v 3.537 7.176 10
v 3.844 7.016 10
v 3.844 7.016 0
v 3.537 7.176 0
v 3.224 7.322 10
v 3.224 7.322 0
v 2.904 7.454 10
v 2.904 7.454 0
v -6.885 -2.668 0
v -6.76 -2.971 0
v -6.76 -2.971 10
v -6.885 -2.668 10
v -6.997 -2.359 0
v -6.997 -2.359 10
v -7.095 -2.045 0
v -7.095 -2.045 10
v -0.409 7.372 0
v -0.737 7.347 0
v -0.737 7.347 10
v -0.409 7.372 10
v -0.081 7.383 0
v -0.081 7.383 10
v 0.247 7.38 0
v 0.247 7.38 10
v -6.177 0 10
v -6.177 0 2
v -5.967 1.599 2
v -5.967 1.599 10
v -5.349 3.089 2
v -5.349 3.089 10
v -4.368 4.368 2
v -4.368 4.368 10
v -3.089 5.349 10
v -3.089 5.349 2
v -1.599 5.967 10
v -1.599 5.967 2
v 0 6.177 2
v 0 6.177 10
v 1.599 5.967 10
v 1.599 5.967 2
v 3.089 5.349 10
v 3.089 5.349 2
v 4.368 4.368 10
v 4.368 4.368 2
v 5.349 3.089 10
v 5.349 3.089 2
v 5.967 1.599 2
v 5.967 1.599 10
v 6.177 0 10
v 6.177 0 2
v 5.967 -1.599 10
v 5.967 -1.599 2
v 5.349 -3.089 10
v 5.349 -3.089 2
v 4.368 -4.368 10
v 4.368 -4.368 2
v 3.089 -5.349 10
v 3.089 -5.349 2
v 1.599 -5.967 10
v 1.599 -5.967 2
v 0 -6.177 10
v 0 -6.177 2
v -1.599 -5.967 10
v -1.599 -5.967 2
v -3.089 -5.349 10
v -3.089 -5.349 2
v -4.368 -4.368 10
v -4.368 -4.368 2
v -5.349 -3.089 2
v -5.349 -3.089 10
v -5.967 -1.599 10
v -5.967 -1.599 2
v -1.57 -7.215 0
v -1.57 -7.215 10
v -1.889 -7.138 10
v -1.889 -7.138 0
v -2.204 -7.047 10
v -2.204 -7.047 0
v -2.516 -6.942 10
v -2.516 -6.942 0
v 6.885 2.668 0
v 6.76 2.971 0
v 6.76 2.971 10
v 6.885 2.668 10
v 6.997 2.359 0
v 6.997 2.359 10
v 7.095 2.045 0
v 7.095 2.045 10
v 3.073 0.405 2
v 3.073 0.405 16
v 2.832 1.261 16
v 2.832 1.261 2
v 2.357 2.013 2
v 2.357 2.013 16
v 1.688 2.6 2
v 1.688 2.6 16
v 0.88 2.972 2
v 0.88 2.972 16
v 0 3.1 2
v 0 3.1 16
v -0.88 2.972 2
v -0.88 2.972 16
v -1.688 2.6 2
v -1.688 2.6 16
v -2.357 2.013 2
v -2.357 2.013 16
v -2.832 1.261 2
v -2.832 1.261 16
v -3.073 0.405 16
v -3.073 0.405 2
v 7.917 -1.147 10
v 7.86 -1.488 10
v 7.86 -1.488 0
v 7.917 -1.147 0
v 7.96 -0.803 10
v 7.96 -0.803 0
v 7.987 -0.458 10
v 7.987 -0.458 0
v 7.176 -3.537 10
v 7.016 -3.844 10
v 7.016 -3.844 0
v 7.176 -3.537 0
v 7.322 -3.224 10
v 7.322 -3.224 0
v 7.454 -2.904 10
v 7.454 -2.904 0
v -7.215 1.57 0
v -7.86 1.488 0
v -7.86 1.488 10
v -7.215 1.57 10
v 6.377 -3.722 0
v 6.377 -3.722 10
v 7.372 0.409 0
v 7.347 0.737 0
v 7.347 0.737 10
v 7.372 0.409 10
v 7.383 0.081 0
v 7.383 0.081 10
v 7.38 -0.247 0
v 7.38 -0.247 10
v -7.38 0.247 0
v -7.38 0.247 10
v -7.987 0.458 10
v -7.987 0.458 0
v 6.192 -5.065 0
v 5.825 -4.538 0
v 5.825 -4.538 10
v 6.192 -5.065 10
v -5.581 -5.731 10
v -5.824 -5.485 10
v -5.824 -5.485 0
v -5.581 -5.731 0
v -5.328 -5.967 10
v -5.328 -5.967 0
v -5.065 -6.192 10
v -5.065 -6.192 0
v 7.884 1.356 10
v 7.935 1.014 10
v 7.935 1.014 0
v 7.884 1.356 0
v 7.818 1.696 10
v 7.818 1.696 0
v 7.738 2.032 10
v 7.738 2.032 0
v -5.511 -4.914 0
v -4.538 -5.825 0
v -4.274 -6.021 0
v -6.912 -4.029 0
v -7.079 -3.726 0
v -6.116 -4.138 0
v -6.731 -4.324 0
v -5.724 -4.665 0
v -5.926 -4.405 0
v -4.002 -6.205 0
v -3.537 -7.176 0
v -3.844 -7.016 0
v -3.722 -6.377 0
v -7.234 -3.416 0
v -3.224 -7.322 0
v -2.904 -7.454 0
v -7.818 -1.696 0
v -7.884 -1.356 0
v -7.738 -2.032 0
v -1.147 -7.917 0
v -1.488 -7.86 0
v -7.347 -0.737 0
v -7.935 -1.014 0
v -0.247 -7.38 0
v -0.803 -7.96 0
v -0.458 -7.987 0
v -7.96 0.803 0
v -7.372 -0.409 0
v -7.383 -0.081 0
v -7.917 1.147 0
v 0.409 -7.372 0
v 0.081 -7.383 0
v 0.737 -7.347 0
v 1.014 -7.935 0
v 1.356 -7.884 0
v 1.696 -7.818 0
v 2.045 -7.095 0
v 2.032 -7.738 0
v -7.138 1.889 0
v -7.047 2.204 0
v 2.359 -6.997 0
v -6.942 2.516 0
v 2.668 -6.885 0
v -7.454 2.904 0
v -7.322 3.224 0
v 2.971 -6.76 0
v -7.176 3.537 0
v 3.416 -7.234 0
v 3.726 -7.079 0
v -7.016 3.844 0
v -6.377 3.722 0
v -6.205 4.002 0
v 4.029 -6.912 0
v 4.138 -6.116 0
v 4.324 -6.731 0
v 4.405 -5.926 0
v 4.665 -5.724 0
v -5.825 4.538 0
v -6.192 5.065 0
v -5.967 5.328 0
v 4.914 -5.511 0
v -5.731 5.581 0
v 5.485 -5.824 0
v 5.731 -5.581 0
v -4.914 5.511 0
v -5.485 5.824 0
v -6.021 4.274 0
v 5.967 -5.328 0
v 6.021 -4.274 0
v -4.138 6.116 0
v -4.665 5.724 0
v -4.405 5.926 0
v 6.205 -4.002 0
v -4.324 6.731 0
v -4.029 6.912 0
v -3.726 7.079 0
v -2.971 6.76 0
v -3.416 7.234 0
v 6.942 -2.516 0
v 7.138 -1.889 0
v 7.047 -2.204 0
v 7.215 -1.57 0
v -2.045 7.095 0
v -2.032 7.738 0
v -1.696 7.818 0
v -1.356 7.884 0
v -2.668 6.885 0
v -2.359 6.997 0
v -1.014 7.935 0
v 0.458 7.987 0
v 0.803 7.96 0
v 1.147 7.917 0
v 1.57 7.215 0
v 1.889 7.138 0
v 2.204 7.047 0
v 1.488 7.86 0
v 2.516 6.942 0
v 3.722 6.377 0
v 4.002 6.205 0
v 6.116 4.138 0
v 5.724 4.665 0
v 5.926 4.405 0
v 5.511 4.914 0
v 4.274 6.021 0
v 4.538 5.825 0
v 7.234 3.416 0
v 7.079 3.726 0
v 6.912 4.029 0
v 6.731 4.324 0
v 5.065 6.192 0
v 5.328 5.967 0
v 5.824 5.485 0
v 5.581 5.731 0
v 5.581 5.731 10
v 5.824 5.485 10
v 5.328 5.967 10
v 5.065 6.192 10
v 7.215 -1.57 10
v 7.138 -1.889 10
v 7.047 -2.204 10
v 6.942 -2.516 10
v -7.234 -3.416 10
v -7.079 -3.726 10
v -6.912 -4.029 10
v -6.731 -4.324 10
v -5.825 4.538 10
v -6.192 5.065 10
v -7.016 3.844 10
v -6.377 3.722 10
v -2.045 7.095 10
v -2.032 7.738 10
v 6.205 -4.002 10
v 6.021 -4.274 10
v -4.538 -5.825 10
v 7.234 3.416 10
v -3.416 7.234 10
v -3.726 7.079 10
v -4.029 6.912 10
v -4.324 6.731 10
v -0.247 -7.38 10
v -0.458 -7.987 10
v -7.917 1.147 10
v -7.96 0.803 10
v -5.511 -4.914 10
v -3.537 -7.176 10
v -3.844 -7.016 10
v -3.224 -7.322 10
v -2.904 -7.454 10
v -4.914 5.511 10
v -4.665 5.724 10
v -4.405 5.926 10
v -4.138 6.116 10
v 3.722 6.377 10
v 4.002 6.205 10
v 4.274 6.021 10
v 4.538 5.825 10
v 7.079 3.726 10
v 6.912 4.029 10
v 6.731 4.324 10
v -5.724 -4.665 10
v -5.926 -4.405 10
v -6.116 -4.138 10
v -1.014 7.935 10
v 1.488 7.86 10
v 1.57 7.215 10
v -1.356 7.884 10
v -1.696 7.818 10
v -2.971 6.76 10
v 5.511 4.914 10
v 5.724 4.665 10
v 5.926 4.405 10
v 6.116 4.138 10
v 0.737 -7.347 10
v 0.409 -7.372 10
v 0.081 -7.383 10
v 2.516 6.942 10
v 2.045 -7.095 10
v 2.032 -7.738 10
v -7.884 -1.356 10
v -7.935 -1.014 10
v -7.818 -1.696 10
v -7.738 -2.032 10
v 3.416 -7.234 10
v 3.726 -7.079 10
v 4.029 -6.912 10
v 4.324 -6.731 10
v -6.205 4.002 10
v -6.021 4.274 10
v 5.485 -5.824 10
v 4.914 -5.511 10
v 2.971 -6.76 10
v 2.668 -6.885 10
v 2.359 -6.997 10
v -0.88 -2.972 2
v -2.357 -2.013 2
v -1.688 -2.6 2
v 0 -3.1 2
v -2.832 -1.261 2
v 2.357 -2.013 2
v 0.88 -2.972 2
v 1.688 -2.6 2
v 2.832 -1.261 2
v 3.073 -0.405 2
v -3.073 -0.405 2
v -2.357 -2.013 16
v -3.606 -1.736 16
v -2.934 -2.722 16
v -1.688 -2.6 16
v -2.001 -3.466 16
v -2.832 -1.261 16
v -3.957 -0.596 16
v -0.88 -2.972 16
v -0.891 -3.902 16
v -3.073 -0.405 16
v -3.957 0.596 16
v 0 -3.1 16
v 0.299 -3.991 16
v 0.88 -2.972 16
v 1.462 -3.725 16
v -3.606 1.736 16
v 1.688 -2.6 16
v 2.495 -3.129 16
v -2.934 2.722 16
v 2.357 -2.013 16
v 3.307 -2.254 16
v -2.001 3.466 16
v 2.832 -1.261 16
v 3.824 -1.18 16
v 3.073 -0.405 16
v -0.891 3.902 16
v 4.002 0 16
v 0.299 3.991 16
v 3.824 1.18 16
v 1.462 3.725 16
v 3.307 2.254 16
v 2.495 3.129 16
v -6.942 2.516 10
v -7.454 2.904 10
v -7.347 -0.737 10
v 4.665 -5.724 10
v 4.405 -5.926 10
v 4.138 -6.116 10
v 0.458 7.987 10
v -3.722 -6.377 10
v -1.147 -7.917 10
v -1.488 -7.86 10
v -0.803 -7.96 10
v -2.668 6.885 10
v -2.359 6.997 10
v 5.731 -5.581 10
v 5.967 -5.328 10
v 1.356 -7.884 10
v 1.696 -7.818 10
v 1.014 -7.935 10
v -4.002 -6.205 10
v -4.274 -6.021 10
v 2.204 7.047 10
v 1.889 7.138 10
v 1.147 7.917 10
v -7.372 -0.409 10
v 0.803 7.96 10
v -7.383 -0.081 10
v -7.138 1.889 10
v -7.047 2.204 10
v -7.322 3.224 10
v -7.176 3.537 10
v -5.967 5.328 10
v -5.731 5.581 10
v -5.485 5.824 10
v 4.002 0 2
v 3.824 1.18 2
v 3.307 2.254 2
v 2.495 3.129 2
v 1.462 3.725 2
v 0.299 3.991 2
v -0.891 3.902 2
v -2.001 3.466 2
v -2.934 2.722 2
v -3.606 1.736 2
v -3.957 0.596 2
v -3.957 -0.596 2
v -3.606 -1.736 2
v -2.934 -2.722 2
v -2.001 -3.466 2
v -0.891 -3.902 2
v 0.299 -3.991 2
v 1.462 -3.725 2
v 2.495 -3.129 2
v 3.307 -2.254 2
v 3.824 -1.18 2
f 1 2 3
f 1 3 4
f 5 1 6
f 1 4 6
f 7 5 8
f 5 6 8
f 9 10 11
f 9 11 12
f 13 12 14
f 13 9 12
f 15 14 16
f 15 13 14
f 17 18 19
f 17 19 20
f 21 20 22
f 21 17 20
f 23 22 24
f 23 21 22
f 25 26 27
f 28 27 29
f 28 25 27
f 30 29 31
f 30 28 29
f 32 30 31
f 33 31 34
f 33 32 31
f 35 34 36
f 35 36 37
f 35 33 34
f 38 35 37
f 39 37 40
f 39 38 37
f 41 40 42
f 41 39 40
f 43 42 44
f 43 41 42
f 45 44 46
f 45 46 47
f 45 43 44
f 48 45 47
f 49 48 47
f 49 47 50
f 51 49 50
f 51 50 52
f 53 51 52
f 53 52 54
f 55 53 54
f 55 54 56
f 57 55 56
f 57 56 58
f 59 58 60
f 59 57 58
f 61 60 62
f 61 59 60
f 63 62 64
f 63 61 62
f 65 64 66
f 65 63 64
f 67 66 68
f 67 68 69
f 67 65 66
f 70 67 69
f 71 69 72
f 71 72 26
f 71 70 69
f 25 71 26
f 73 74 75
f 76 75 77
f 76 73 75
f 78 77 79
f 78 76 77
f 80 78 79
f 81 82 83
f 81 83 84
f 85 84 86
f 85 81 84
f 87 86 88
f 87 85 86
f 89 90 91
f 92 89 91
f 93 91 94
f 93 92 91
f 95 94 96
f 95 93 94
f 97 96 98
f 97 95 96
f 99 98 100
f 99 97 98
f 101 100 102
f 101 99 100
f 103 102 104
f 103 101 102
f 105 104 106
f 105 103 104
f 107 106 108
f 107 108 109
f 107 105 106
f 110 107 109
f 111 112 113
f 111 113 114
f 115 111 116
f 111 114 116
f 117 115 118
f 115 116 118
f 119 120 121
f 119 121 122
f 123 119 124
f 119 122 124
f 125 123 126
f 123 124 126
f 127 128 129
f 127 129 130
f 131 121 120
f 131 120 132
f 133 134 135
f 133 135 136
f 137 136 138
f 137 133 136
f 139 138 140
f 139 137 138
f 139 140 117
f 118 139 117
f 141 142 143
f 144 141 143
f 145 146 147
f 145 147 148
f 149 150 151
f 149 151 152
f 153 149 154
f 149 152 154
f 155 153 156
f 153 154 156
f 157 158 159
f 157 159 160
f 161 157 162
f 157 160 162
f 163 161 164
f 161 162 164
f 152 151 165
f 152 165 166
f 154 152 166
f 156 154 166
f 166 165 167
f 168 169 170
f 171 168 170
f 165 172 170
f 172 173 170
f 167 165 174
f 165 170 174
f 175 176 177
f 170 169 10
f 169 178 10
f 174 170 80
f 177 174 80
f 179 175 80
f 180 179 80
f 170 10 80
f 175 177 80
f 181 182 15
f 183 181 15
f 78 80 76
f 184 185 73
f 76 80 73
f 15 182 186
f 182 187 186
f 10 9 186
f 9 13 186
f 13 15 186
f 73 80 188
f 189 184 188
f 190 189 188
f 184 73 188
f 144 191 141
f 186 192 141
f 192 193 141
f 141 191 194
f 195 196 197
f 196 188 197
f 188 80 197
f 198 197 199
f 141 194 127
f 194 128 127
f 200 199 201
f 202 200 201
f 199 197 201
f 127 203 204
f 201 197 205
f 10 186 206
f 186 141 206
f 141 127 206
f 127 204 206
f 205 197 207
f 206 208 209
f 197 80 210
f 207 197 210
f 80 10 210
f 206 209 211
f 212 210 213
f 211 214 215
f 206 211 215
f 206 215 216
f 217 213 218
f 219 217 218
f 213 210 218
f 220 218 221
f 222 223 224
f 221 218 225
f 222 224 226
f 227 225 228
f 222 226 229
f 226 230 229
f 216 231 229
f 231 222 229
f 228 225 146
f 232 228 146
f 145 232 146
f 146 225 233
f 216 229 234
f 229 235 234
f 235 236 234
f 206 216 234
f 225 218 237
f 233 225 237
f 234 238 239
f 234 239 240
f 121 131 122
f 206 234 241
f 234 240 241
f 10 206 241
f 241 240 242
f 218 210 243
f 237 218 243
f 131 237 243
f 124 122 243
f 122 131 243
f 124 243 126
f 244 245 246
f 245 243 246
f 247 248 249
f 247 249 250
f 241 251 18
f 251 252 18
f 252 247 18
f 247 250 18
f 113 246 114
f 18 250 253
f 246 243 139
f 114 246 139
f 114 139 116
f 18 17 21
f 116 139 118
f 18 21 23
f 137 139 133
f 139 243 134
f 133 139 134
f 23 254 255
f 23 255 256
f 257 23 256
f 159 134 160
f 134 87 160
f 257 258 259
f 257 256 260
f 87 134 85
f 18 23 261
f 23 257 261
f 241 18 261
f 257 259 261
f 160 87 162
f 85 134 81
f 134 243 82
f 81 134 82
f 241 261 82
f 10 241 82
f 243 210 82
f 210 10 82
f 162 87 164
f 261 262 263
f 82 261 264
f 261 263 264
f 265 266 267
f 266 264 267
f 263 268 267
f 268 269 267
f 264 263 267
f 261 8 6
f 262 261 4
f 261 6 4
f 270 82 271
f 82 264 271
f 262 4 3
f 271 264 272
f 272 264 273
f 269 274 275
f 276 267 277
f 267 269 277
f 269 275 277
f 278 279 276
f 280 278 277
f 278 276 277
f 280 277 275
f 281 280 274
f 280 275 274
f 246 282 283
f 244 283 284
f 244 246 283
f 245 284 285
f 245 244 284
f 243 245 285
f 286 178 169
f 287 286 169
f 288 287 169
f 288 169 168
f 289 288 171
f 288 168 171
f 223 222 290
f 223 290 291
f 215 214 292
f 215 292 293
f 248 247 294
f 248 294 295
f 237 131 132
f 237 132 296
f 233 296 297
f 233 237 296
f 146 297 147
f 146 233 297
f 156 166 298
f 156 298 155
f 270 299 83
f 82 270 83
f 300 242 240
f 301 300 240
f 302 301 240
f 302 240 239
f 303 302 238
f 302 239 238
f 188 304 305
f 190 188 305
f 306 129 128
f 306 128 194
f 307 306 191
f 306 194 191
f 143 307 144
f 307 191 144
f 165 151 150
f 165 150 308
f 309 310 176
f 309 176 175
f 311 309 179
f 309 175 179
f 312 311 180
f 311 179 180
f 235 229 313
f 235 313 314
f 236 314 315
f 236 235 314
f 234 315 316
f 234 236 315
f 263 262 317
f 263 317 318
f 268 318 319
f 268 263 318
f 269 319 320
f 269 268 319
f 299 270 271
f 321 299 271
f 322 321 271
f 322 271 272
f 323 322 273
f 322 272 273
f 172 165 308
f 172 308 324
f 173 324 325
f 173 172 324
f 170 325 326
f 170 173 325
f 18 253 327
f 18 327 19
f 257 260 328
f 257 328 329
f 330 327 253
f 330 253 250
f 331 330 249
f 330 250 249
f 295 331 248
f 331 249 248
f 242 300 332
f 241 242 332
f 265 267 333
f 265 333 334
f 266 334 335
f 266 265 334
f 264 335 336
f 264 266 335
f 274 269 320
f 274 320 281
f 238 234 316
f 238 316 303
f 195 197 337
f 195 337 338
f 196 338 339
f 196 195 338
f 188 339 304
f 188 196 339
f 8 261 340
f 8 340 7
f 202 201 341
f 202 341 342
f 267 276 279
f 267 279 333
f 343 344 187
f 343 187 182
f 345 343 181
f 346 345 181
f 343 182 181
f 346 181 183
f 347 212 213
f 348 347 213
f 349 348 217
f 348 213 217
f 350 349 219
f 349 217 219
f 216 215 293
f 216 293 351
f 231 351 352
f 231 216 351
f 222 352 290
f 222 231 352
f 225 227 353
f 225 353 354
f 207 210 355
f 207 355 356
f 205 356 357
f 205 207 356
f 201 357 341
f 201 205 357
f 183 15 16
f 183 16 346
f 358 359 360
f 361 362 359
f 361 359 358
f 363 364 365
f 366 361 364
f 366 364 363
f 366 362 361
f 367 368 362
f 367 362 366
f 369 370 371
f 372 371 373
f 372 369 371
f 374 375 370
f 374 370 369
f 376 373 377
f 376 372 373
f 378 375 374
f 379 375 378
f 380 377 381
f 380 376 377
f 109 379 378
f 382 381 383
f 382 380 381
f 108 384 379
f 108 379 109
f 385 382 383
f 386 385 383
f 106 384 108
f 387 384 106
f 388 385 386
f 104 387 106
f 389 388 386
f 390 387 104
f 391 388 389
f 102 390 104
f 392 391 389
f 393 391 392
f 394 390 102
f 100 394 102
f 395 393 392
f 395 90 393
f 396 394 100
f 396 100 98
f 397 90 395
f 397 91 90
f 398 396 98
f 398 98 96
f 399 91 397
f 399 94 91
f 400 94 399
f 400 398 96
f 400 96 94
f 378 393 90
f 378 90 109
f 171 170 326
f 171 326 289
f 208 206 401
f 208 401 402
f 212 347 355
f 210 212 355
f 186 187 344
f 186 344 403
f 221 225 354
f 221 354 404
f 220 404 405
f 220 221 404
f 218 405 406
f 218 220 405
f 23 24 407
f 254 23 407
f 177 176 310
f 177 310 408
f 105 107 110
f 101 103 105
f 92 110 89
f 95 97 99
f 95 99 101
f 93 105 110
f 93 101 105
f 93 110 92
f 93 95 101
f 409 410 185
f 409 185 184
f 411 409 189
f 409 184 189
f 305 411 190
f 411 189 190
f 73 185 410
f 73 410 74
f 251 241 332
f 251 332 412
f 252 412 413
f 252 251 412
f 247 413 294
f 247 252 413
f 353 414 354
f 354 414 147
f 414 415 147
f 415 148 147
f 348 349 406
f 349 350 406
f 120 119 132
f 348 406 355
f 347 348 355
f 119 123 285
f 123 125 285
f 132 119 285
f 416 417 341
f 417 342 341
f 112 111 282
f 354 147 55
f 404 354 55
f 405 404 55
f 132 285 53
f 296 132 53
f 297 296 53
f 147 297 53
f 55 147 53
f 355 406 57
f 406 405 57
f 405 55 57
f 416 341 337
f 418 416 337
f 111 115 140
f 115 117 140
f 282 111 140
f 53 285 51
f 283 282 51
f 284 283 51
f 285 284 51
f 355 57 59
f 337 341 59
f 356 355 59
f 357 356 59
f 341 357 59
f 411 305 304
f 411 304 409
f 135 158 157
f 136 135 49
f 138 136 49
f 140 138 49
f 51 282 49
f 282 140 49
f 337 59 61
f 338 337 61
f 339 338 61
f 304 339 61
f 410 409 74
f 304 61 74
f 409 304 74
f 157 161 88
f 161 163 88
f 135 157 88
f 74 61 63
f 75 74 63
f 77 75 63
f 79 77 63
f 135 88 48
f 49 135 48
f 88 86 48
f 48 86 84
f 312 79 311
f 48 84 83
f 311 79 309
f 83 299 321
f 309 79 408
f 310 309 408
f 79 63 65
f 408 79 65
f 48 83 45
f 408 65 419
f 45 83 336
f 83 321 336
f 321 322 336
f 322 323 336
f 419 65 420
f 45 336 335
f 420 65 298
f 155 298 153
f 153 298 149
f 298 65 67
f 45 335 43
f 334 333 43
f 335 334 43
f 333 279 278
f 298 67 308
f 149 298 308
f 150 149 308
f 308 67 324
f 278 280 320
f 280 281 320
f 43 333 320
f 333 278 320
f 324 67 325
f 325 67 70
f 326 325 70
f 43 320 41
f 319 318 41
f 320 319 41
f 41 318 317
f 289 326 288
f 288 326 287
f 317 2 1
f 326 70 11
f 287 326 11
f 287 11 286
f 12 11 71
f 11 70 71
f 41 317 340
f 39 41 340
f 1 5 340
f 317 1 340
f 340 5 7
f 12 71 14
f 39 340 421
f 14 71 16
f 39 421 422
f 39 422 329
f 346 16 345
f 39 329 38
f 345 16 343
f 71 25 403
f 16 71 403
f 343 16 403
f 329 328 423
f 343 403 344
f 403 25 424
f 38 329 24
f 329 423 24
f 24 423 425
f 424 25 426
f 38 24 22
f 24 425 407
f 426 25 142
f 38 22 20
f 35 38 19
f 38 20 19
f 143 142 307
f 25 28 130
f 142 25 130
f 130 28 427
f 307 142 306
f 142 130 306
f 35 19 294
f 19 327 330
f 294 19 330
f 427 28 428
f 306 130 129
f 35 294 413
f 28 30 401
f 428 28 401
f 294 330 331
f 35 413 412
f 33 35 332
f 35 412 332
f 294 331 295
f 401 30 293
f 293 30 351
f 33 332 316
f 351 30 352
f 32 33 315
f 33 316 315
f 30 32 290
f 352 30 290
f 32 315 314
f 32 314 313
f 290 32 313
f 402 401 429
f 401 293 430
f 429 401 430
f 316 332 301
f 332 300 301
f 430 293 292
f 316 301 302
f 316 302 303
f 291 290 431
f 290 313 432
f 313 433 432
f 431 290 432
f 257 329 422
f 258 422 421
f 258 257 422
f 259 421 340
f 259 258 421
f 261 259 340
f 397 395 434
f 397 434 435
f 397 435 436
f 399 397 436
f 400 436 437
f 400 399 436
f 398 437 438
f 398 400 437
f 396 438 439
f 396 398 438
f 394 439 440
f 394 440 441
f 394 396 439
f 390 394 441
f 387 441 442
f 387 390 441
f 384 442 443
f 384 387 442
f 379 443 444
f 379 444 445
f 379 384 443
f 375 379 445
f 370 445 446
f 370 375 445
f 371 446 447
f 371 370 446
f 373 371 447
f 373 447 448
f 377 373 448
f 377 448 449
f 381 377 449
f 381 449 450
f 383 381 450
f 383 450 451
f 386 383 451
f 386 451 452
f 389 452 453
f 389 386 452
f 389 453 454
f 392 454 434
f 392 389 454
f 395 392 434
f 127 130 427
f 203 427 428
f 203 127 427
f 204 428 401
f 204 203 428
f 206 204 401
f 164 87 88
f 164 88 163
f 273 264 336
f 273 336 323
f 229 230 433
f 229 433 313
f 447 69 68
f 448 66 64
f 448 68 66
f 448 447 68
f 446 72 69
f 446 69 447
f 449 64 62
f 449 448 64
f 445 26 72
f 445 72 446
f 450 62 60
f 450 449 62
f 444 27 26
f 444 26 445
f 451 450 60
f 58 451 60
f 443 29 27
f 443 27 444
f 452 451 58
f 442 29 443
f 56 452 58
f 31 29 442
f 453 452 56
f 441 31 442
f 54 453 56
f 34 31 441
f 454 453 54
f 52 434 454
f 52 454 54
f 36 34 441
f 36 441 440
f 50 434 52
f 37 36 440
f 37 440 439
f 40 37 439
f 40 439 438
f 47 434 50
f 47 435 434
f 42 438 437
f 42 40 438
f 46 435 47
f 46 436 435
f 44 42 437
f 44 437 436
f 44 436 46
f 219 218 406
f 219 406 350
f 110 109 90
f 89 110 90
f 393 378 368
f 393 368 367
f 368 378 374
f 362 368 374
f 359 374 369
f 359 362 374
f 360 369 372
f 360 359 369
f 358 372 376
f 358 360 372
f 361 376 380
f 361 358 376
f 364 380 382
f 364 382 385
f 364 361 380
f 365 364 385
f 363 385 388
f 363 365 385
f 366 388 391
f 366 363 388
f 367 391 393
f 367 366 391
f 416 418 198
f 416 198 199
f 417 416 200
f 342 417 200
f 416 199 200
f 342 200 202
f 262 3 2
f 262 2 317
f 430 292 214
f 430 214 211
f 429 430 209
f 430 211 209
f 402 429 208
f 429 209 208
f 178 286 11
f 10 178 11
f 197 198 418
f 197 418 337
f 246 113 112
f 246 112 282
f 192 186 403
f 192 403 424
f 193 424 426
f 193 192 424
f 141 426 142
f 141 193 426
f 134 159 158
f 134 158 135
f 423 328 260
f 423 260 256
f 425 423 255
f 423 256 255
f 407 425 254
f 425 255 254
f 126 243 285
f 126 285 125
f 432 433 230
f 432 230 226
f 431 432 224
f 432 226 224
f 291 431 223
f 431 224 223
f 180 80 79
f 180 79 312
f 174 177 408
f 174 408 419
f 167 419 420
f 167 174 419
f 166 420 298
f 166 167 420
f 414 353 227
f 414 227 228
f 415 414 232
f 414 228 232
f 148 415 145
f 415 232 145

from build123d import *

# Parameters (mm, degrees)
CROQUIS1_R                    = 8
SALIENTE_EXTRUIR1_DEPTH       = 10
CROQUIS2_R                    = 7
CORTAR_EXTRUIR1_DEPTH         = 8
CROQUIS3_R                    = 5
SALIENTE_EXTRUIR2_DEPTH       = 14
CROQUIS4_R                    = 3.5
CORTAR_EXTRUIR2_DEPTH         = 14
CROQUIS5_W                    = 8.830556774
CROQUIS5_H                    = 0.810001326
SALIENTE_EXTRUIR3_DEPTH       = 14
SALIENTE_EXTRUIR4_START       = -10
SALIENTE_EXTRUIR4_OUTLINE_R   = 7
SALIENTE_EXTRUIR4_OUTLINE_R_2 = 6.177042676
SALIENTE_EXTRUIR4_DEPTH       = 8
CORTAR_EXTRUIR10_DEPTH        = 10
SALIENTE_EXTRUIR7_START       = -14
CROQUIS12_R                   = 3.5
CROQUIS12_R_2                 = 3.1
SALIENTE_EXTRUIR7_DEPTH       = 14
CROQUIS14_R                   = 5.293122991
CROQUIS14_R_2                 = 4.002052416
CORTAR_EXTRUIR15_DEPTH        = 14


# Read off the part's stored shape, not the designer's step: Saliente-Extruir4
with BuildPart() as part:
    # Croquis1 → Saliente-Extruir1 (new body)
    with BuildSketch(Plane.XY):
        Circle(CROQUIS1_R)
    extrude(amount=SALIENTE_EXTRUIR1_DEPTH)

    # Croquis2 → Cortar-Extruir1 (cut)
    with BuildSketch(Plane.XY.offset(10)):
        Circle(CROQUIS2_R)
    extrude(amount=-CORTAR_EXTRUIR1_DEPTH, mode=Mode.SUBTRACT)

    # Croquis3 → Saliente-Extruir2 (add)
    with BuildSketch(Plane.XY.offset(2)):
        Circle(CROQUIS3_R)
    extrude(amount=SALIENTE_EXTRUIR2_DEPTH)

    # Croquis4 → Cortar-Extruir2 (cut)
    with BuildSketch(Plane.XY.offset(16)):
        Circle(CROQUIS4_R)
    extrude(amount=-CORTAR_EXTRUIR2_DEPTH, mode=Mode.SUBTRACT)

    # Croquis5 → Saliente-Extruir3 (add)
    with BuildSketch(Plane.XY.offset(2)):
        Rectangle(CROQUIS5_W, CROQUIS5_H)
    extrude(amount=SALIENTE_EXTRUIR3_DEPTH)

    # Saliente-Extruir4 outline → Saliente-Extruir4 (add)
    with BuildSketch(Plane(origin=(0, 0, 0), x_dir=(-1, 0, 0), z_dir=(0, 0, -1)).offset(SALIENTE_EXTRUIR4_START)):
        Circle(SALIENTE_EXTRUIR4_OUTLINE_R)
        Circle(SALIENTE_EXTRUIR4_OUTLINE_R_2, mode=Mode.SUBTRACT)
    extrude(amount=SALIENTE_EXTRUIR4_DEPTH)

    # Croquis11 → Cortar-Extruir10 (cut)
    with BuildSketch(Plane(origin=(0, 0, 0), x_dir=(-1, 0, 0), z_dir=(0, 0, -1))):
        with BuildLine():
            Line((-0.247260298, 7.379594776), (-0.5002941, 8.108053777))
            Line((-0.5002941, 8.108053777), (1.061510951, 8.036738478))
            Line((1.061510951, 8.036738478), (0.736778233, 7.346884683))
            ThreePointArc((0.736778233, 7.346884683), (0.245304789, 7.379660038), (-0.247260298, 7.379594776))
        make_face()
        with BuildLine():
            Line((2.029718445, 7.865816758), (3.493045676, 7.315367575))
            Line((3.493045676, 7.315367575), (2.971029962, 6.759625557))
            ThreePointArc((2.971029962, 6.759625557), (2.513739083, 6.942670418), (2.045261679, 7.094819334))
            Line((2.045261679, 7.094819334), (2.029718445, 7.865816758))
        make_face()
        with BuildLine():
            Line((4.137579194, 6.115553542), (4.361048006, 6.853618791))
            Line((4.361048006, 6.853618791), (5.582656753, 5.877917526))
            Line((5.582656753, 5.877917526), (4.914456579, 5.510687185))
            ThreePointArc((4.914456579, 5.510687185), (4.536111081, 5.826083846), (4.137579194, 6.115553542))
        make_face()
        with BuildLine():
            Line((5.824881629, 4.537654761), (6.265487803, 5.170540864))
            Line((6.265487803, 5.170540864), (7.12579849, 3.865095955))
            Line((7.12579849, 3.865095955), (6.376821944, 3.722324356))
            ThreePointArc((6.376821944, 3.722324356), (6.114456921, 4.139199594), (5.824881629, 4.537654761))
        make_face()
        with BuildLine():
            Line((6.942004065, 2.515578715), (7.556618, 2.981334372))
            Line((7.556618, 2.981334372), (7.971417423, 1.473931862))
            Line((7.971417423, 1.473931862), (7.214979548, 1.569594483))
            ThreePointArc((7.214979548, 1.569594483), (7.094277116, 2.047141646), (6.942004065, 2.515578715))
        make_face()
        with BuildLine():
            Line((7.379594776, 0.247260298), (8.108053777, 0.5002941))
            Line((8.108053777, 0.5002941), (8.036738478, -1.061510951))
            Line((8.036738478, -1.061510951), (7.346884683, -0.736778233))
            ThreePointArc((7.346884683, -0.736778233), (7.379660038, -0.245304789), (7.379594776, 0.247260298))
        make_face()
        with BuildLine():
            Line((7.094819334, -2.045261679), (7.865816758, -2.029718445))
            Line((7.865816758, -2.029718445), (7.315367575, -3.493045676))
            Line((7.315367575, -3.493045676), (6.759625557, -2.971029962))
            ThreePointArc((6.759625557, -2.971029962), (6.942670418, -2.513739083), (7.094819334, -2.045261679))
        make_face()
        with BuildLine():
            Line((6.115553542, -4.137579194), (6.853618791, -4.361048006))
            Line((6.853618791, -4.361048006), (5.877917526, -5.582656753))
            Line((5.877917526, -5.582656753), (5.510687185, -4.914456579))
            ThreePointArc((5.510687185, -4.914456579), (5.826083846, -4.536111081), (6.115553542, -4.137579194))
        make_face()
        with BuildLine():
            Line((4.537654761, -5.824881629), (5.170540864, -6.265487803))
            Line((5.170540864, -6.265487803), (3.865095955, -7.12579849))
            Line((3.865095955, -7.12579849), (3.722324356, -6.376821944))
            ThreePointArc((3.722324356, -6.376821944), (4.139199594, -6.114456921), (4.537654761, -5.824881629))
        make_face()
        with BuildLine():
            Line((2.515578715, -6.942004065), (2.981334372, -7.556618))
            Line((2.981334372, -7.556618), (1.473931862, -7.971417423))
            Line((1.473931862, -7.971417423), (1.569594483, -7.214979548))
            ThreePointArc((1.569594483, -7.214979548), (2.047141646, -7.094277116), (2.515578715, -6.942004065))
        make_face()
        with BuildLine():
            Line((0.247260298, -7.379594776), (0.5002941, -8.108053777))
            Line((0.5002941, -8.108053777), (-1.061510951, -8.036738478))
            Line((-1.061510951, -8.036738478), (-0.736778233, -7.346884683))
            ThreePointArc((-0.736778233, -7.346884683), (-0.245304789, -7.379660038), (0.247260298, -7.379594776))
        make_face()
        with BuildLine():
            Line((-2.045261679, -7.094819334), (-2.029718445, -7.865816758))
            Line((-2.029718445, -7.865816758), (-3.493045676, -7.315367575))
            Line((-3.493045676, -7.315367575), (-2.971029962, -6.759625557))
            ThreePointArc((-2.971029962, -6.759625557), (-2.513739083, -6.942670418), (-2.045261679, -7.094819334))
        make_face()
        with BuildLine():
            Line((-4.137579194, -6.115553542), (-4.361048006, -6.853618791))
            Line((-4.361048006, -6.853618791), (-5.582656753, -5.877917526))
            Line((-5.582656753, -5.877917526), (-4.914456579, -5.510687185))
            ThreePointArc((-4.914456579, -5.510687185), (-4.536111081, -5.826083846), (-4.137579194, -6.115553542))
        make_face()
        with BuildLine():
            Line((-5.824881629, -4.537654761), (-6.265487803, -5.170540864))
            Line((-6.265487803, -5.170540864), (-7.12579849, -3.865095955))
            Line((-7.12579849, -3.865095955), (-6.376821944, -3.722324356))
            ThreePointArc((-6.376821944, -3.722324356), (-6.114456921, -4.139199594), (-5.824881629, -4.537654761))
        make_face()
        with BuildLine():
            Line((-6.942004065, -2.515578715), (-7.556618, -2.981334372))
            Line((-7.556618, -2.981334372), (-7.971417423, -1.473931862))
            Line((-7.971417423, -1.473931862), (-7.214979548, -1.569594483))
            ThreePointArc((-7.214979548, -1.569594483), (-7.094277116, -2.047141646), (-6.942004065, -2.515578715))
        make_face()
        with BuildLine():
            Line((-7.379594776, -0.247260298), (-8.108053777, -0.5002941))
            Line((-8.108053777, -0.5002941), (-8.036738478, 1.061510951))
            Line((-8.036738478, 1.061510951), (-7.346884683, 0.736778233))
            ThreePointArc((-7.346884683, 0.736778233), (-7.379660038, 0.245304789), (-7.379594776, -0.247260298))
        make_face()
        with BuildLine():
            Line((-7.094819334, 2.045261679), (-7.865816758, 2.029718445))
            Line((-7.865816758, 2.029718445), (-7.315367575, 3.493045676))
            Line((-7.315367575, 3.493045676), (-6.759625557, 2.971029962))
            ThreePointArc((-6.759625557, 2.971029962), (-6.942670418, 2.513739083), (-7.094819334, 2.045261679))
        make_face()
        with BuildLine():
            Line((-6.115553542, 4.137579194), (-6.853618791, 4.361048006))
            Line((-6.853618791, 4.361048006), (-5.877917526, 5.582656753))
            Line((-5.877917526, 5.582656753), (-5.510687185, 4.914456579))
            ThreePointArc((-5.510687185, 4.914456579), (-5.826083846, 4.536111081), (-6.115553542, 4.137579194))
        make_face()
        with BuildLine():
            Line((-4.537654761, 5.824881629), (-5.170540864, 6.265487803))
            Line((-5.170540864, 6.265487803), (-3.865095955, 7.12579849))
            Line((-3.865095955, 7.12579849), (-3.722324356, 6.376821944))
            ThreePointArc((-3.722324356, 6.376821944), (-4.139199594, 6.114456921), (-4.537654761, 5.824881629))
        make_face()
        with BuildLine():
            Line((-2.515578715, 6.942004065), (-2.981334372, 7.556618))
            Line((-2.981334372, 7.556618), (-1.473931862, 7.971417423))
            Line((-1.473931862, 7.971417423), (-1.569594483, 7.214979548))
            ThreePointArc((-1.569594483, 7.214979548), (-2.047141646, 7.094277116), (-2.515578715, 6.942004065))
        make_face()
    extrude(amount=-CORTAR_EXTRUIR10_DEPTH, mode=Mode.SUBTRACT)

    # Croquis12 → Saliente-Extruir7 (add)
    with BuildSketch(Plane.XY.offset(16).offset(SALIENTE_EXTRUIR7_START)):
        Circle(CROQUIS12_R)
        Circle(CROQUIS12_R_2, mode=Mode.SUBTRACT)
    extrude(amount=SALIENTE_EXTRUIR7_DEPTH)

    # Croquis14 → Cortar-Extruir15 (cut)
    with BuildSketch(Plane.XY.offset(16)):
        Circle(CROQUIS14_R)
        Circle(CROQUIS14_R_2, mode=Mode.SUBTRACT)
    extrude(amount=-CORTAR_EXTRUIR15_DEPTH, mode=Mode.SUBTRACT)


solid = part.part
